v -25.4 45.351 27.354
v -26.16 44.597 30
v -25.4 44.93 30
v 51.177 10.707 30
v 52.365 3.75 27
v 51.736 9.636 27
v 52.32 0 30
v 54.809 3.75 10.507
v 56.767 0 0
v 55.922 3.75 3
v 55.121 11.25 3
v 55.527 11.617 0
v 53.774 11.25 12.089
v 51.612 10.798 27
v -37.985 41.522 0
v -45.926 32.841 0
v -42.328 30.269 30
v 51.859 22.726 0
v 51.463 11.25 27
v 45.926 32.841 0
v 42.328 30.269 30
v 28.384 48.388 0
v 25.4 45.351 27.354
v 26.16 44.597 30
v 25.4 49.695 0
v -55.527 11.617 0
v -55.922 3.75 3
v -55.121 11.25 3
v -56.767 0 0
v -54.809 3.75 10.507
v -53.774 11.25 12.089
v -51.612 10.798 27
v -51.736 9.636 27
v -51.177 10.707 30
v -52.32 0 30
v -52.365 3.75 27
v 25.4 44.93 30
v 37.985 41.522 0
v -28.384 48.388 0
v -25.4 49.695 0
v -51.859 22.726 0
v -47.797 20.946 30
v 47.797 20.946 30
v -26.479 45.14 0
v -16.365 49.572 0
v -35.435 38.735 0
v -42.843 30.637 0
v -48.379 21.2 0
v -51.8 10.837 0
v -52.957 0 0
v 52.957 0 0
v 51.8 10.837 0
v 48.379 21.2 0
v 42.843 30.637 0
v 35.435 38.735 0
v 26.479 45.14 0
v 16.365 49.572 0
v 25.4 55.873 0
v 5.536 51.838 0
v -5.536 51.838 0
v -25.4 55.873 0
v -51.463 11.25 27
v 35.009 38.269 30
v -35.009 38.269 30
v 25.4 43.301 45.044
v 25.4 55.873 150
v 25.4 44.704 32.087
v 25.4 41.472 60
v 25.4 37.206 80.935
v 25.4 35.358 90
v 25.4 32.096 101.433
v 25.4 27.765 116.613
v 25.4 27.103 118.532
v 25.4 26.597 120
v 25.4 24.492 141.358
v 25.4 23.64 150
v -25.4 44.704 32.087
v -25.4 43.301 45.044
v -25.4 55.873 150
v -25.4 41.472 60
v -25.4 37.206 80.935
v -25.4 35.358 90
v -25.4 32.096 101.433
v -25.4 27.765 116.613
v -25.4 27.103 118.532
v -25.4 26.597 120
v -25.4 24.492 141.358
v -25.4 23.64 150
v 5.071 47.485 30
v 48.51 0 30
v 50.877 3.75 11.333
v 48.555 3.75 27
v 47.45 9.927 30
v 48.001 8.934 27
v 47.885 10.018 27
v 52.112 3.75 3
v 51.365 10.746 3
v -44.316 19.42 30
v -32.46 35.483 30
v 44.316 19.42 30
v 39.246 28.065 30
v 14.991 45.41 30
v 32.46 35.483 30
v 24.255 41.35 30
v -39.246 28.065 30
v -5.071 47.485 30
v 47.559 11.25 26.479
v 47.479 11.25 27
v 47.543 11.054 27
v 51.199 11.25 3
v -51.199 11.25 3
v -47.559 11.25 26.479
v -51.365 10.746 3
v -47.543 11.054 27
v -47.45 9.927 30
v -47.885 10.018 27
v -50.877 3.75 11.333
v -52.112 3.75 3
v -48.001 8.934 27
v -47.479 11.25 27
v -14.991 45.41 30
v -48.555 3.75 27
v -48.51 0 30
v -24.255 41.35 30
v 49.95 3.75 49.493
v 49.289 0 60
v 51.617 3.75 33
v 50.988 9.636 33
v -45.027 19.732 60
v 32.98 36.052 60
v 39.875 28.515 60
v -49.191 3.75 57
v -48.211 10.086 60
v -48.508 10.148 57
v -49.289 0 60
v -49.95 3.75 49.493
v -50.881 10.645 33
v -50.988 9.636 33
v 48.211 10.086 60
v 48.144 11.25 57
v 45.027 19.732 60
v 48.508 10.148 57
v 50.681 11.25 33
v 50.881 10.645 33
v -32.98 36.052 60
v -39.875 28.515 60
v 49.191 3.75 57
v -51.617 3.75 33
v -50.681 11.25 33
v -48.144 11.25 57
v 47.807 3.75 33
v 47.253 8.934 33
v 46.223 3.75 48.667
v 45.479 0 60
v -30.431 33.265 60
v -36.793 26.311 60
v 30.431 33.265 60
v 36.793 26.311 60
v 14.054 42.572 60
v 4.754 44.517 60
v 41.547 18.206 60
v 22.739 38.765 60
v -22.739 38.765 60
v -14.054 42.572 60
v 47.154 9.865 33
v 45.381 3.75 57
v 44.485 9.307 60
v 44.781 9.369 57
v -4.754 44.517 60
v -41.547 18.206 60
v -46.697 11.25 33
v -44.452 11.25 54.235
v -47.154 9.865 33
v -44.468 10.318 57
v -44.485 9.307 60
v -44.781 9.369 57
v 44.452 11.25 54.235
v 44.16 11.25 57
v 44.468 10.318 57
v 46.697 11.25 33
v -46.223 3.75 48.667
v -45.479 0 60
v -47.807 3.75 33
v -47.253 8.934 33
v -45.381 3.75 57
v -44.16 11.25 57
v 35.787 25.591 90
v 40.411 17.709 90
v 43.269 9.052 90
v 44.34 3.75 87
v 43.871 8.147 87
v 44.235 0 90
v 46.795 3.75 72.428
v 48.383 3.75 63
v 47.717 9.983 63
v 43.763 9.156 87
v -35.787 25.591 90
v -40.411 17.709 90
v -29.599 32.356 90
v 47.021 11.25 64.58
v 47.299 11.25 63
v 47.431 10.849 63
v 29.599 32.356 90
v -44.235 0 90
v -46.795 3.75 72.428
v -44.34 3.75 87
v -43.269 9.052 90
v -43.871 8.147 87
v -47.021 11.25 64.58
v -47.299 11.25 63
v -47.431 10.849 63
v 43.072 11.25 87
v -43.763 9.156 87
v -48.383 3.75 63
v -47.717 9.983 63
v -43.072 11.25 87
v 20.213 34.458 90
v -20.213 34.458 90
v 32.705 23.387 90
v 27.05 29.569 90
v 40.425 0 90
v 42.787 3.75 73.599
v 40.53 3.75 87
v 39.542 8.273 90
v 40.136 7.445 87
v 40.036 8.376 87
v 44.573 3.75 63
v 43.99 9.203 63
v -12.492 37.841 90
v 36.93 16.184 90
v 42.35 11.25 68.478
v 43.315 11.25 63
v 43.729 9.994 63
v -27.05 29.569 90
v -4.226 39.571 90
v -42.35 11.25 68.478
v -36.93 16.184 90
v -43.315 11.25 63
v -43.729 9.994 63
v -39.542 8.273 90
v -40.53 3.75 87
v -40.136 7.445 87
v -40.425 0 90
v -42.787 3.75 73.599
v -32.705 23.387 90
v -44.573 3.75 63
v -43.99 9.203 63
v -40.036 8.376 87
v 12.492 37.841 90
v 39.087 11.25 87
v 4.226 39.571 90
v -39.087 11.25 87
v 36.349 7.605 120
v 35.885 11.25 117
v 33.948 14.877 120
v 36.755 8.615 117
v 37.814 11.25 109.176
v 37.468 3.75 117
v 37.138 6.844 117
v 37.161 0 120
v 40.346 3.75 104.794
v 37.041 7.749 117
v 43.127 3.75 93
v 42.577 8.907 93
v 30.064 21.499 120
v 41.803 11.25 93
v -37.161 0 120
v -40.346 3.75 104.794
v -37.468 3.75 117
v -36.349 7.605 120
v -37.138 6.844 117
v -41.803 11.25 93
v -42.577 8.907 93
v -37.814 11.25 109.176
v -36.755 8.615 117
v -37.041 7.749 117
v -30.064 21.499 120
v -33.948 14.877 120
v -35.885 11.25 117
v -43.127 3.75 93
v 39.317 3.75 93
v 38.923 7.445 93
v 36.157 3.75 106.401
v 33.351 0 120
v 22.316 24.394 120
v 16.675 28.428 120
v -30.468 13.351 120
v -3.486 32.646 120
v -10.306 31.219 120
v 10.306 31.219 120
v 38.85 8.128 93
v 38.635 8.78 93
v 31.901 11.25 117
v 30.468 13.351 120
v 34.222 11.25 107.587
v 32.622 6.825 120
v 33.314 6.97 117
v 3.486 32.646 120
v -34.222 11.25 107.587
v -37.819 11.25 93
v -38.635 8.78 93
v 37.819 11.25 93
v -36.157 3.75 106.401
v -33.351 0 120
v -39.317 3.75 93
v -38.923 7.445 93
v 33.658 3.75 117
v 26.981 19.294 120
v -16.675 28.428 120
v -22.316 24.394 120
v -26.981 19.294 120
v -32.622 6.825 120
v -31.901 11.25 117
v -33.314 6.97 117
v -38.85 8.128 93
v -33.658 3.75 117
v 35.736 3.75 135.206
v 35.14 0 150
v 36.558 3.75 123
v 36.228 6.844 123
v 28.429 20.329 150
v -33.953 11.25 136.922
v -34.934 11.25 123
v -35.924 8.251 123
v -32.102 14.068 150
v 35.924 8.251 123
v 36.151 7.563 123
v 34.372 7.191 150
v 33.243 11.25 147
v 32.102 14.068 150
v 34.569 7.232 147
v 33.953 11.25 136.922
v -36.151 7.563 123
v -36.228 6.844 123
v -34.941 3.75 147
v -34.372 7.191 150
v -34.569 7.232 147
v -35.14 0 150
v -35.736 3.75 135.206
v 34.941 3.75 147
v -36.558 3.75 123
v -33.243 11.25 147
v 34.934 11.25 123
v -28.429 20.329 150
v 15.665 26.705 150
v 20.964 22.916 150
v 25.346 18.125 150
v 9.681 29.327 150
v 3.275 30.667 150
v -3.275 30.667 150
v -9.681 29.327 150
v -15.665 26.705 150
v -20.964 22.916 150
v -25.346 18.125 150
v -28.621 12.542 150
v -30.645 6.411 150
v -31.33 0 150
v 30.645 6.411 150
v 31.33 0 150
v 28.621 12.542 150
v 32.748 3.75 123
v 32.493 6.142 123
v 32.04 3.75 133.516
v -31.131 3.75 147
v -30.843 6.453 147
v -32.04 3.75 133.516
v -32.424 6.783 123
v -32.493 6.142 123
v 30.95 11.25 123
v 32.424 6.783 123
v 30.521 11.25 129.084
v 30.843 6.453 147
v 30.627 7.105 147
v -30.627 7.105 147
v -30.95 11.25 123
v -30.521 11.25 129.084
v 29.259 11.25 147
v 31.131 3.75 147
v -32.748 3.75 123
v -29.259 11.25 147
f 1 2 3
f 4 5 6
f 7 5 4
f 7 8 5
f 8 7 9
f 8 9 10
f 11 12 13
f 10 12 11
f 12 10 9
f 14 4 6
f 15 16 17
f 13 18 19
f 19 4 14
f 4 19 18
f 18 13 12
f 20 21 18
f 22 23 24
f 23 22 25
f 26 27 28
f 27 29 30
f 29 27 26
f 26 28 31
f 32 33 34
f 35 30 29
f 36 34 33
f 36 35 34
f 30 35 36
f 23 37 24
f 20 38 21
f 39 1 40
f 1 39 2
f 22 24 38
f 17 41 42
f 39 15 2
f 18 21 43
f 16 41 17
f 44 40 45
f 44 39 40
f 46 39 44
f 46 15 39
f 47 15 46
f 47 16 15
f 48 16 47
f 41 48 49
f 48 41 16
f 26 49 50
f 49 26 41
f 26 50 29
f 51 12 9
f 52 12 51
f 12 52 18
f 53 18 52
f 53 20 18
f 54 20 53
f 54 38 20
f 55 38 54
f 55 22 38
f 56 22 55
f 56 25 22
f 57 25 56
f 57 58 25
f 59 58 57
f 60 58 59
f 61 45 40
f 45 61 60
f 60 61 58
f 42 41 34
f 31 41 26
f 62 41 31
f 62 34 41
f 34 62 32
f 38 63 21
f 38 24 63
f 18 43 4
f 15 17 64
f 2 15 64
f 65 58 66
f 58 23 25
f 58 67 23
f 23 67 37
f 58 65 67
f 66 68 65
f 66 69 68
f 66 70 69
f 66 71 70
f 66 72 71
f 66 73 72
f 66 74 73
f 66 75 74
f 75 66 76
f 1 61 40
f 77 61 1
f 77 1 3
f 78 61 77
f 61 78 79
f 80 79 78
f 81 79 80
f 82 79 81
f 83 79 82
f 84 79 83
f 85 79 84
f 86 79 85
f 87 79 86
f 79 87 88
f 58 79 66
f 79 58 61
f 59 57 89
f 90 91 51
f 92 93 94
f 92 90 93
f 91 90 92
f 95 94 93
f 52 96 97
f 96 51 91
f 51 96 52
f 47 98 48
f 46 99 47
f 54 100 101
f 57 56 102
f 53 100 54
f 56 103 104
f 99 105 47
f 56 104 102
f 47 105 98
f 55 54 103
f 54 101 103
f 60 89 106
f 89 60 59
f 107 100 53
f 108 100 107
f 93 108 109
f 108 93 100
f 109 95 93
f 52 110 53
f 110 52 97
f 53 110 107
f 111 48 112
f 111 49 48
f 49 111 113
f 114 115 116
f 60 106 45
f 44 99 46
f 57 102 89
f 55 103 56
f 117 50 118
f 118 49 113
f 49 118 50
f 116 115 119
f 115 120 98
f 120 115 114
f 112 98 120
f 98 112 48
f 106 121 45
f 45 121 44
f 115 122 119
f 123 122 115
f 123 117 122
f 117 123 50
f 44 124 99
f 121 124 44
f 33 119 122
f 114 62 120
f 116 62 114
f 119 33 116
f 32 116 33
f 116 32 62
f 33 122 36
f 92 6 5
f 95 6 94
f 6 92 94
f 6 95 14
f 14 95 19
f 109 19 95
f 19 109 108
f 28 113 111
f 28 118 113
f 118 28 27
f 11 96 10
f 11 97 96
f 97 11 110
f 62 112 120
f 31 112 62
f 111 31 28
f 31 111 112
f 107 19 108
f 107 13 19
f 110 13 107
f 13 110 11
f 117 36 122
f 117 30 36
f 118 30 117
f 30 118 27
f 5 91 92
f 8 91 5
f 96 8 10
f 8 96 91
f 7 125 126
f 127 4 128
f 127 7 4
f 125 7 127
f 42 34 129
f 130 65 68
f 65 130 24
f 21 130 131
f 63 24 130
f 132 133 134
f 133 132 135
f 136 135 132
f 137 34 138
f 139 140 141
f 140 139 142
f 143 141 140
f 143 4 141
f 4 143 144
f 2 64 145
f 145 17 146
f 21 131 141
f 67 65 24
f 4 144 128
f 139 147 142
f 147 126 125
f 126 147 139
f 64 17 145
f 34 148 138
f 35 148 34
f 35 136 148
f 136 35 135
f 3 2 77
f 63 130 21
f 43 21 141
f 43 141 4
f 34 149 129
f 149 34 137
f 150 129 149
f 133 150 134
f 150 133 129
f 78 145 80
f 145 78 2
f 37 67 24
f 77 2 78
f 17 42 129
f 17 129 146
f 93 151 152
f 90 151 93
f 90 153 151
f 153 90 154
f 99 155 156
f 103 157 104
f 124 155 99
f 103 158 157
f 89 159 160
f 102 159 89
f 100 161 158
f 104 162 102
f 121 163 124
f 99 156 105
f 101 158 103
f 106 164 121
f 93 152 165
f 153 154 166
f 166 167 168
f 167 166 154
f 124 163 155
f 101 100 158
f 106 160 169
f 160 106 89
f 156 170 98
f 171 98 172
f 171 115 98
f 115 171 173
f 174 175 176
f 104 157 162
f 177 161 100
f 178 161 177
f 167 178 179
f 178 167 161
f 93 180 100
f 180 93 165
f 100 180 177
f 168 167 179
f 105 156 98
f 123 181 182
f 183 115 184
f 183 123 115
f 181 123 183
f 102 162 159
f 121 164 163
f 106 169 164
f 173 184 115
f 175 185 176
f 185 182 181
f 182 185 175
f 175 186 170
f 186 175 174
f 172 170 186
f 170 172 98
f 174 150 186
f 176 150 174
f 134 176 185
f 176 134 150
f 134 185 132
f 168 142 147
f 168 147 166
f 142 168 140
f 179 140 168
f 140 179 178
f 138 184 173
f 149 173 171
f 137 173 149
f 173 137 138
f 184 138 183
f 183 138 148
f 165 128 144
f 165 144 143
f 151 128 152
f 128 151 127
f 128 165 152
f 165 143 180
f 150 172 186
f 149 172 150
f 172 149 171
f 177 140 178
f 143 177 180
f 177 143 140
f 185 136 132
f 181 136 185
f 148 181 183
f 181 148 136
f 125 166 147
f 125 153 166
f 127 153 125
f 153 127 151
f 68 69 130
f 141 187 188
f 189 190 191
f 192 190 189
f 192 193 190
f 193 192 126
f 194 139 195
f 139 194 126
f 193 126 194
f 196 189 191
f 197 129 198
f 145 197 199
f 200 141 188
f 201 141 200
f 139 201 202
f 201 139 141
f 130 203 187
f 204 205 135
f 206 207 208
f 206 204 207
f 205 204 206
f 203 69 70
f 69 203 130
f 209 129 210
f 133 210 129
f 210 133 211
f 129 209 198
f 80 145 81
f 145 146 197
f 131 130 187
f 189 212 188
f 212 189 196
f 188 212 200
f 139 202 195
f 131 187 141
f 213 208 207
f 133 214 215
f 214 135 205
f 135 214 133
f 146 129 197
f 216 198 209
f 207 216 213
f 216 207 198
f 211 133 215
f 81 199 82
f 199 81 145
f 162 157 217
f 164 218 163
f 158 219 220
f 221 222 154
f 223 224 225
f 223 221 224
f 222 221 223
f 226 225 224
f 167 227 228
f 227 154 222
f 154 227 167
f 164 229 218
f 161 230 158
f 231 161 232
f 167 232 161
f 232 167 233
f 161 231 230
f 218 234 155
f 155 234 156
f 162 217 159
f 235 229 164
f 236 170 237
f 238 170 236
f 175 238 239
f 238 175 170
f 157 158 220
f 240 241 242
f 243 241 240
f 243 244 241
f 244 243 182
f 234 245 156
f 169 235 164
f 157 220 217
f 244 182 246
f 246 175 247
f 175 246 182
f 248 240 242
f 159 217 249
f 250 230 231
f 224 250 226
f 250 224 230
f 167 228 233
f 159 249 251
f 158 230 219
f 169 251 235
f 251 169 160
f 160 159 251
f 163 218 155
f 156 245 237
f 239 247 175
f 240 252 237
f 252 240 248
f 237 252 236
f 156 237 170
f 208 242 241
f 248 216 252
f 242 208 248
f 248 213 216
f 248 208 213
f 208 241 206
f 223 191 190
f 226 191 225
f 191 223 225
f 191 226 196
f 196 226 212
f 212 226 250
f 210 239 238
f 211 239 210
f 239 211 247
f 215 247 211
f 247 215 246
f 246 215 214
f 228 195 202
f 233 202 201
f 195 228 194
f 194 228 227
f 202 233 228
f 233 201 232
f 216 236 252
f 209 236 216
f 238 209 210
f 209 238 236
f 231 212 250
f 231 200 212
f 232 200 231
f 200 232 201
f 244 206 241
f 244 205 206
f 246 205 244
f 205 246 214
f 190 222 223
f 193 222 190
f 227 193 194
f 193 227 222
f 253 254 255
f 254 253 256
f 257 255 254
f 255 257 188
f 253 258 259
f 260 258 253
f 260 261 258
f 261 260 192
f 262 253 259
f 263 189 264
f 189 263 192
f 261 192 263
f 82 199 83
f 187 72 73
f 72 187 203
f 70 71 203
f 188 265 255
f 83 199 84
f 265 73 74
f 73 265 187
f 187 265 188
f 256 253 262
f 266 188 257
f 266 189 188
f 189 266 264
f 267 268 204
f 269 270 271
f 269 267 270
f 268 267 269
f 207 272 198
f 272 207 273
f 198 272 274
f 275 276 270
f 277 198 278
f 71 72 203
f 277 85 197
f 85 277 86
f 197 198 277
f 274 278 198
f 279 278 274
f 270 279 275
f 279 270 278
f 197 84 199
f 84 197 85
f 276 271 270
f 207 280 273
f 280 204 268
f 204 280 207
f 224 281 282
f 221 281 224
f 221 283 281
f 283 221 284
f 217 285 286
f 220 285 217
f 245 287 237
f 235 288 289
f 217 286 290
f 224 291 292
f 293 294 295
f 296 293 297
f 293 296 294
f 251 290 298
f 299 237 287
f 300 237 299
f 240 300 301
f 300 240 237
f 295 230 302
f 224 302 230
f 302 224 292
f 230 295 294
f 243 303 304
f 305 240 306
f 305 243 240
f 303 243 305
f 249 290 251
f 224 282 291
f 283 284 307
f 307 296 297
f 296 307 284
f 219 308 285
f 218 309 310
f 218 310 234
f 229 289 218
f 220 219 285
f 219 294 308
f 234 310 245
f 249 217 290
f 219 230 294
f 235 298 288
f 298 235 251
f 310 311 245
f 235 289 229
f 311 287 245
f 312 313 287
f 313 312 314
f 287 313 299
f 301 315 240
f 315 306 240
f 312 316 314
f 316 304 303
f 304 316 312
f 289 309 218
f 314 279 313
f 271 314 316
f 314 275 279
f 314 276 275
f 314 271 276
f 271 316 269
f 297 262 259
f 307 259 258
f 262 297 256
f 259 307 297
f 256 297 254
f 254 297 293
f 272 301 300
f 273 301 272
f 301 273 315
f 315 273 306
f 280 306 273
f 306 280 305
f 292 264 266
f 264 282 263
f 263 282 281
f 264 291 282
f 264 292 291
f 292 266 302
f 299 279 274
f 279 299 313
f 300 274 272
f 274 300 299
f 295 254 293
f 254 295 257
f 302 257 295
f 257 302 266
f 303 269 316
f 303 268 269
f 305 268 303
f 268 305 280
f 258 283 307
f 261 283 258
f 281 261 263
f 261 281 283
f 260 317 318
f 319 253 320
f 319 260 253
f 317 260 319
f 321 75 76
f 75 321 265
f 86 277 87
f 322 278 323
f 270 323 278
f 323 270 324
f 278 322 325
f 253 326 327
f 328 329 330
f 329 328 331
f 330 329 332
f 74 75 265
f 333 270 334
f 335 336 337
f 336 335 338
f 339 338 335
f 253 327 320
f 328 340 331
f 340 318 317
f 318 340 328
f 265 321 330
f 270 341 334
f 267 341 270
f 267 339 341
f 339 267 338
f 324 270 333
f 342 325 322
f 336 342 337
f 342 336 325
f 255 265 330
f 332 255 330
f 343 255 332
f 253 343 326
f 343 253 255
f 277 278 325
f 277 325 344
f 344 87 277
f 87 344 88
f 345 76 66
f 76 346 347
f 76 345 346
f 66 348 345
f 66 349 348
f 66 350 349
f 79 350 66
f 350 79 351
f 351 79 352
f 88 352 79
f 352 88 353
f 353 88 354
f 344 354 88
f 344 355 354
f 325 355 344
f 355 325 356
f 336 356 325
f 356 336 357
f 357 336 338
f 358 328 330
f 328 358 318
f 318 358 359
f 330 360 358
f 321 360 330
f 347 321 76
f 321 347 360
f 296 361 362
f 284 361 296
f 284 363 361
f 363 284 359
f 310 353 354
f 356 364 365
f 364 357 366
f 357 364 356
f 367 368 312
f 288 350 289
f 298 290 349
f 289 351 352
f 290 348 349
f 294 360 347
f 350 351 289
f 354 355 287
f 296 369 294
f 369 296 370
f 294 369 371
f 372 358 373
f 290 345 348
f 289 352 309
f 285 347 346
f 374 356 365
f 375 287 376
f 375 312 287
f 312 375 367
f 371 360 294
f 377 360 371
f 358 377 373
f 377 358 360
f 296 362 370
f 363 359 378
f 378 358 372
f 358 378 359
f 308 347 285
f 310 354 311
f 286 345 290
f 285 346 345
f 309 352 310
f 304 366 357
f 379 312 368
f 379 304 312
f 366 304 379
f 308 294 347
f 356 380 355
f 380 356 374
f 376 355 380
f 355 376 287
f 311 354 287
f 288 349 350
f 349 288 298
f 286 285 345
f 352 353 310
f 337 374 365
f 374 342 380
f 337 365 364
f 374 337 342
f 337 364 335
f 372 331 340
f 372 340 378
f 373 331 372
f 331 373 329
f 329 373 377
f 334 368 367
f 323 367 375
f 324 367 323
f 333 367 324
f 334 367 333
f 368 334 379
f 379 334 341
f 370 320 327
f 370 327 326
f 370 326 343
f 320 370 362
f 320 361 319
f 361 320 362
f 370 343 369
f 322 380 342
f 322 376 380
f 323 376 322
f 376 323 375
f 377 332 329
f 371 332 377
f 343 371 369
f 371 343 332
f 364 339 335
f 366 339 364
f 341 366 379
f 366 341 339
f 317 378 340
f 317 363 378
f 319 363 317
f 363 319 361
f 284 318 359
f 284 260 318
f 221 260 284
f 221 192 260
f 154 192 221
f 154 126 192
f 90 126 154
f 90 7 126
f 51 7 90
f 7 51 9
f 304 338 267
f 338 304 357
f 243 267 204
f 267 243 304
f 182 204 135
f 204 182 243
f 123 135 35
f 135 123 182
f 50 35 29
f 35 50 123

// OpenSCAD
scale([1.27,1.25,1]) difference()  {
union()  {
translate([0.0,0.0,0.0])difference()  {
union()  {
cylinder(r1=44.69859509007658,r2=41.197186342054884,h=30.0);
translate([-20.0,0.0,0.0])cube([40.0,44.69859509007658,30.0]);
}
cylinder(r1=41.69859509007658,r2=38.197186342054884,h=30.0);
translate([-44.69859509007658,3.0,3.0])cube([89.39719018015316,6.0,24.0]);
}
translate([0.0,0.0,30.0])difference()  {
union()  {
cylinder(r1=41.197186342054884,r2=38.80986219567645,h=30.0);
translate([-20.0,0.0,0.0])cube([40.0,44.69859509007658,30.0]);
}
cylinder(r1=38.197186342054884,r2=35.80986219567645,h=30.0);
translate([-44.69859509007658,3.0,3.0])cube([89.39719018015316,6.0,24.0]);
}
translate([0.0,0.0,60.0])difference()  {
union()  {
cylinder(r1=38.80986219567645,r2=34.83098861837907,h=30.0);
translate([-20.0,0.0,0.0])cube([40.0,44.69859509007658,30.0]);
}
cylinder(r1=35.80986219567645,r2=31.830988618379067,h=30.0);
translate([-44.69859509007658,3.0,3.0])cube([89.39719018015316,6.0,24.0]);
}
translate([0.0,0.0,90.0])difference()  {
union()  {
cylinder(r1=34.83098861837907,r2=29.26056561016273,h=30.0);
translate([-20.0,0.0,0.0])cube([40.0,44.69859509007658,30.0]);
}
cylinder(r1=31.830988618379067,r2=26.260565610162732,h=30.0);
translate([-44.69859509007658,3.0,3.0])cube([89.39719018015316,6.0,24.0]);
}
translate([0.0,0.0,120.0])difference()  {
union()  {
cylinder(r1=29.26056561016273,r2=27.669016179243776,h=30.0);
translate([-20.0,0.0,0.0])cube([40.0,44.69859509007658,30.0]);
}
cylinder(r1=26.260565610162732,r2=24.669016179243776,h=30.0);
translate([-44.69859509007658,3.0,3.0])cube([89.39719018015316,6.0,24.0]);
}
}
translate([-44.69859509007658,-44.69859509007658,0.0])cube([89.39719018015316,44.69859509007658,180.0]);
}
